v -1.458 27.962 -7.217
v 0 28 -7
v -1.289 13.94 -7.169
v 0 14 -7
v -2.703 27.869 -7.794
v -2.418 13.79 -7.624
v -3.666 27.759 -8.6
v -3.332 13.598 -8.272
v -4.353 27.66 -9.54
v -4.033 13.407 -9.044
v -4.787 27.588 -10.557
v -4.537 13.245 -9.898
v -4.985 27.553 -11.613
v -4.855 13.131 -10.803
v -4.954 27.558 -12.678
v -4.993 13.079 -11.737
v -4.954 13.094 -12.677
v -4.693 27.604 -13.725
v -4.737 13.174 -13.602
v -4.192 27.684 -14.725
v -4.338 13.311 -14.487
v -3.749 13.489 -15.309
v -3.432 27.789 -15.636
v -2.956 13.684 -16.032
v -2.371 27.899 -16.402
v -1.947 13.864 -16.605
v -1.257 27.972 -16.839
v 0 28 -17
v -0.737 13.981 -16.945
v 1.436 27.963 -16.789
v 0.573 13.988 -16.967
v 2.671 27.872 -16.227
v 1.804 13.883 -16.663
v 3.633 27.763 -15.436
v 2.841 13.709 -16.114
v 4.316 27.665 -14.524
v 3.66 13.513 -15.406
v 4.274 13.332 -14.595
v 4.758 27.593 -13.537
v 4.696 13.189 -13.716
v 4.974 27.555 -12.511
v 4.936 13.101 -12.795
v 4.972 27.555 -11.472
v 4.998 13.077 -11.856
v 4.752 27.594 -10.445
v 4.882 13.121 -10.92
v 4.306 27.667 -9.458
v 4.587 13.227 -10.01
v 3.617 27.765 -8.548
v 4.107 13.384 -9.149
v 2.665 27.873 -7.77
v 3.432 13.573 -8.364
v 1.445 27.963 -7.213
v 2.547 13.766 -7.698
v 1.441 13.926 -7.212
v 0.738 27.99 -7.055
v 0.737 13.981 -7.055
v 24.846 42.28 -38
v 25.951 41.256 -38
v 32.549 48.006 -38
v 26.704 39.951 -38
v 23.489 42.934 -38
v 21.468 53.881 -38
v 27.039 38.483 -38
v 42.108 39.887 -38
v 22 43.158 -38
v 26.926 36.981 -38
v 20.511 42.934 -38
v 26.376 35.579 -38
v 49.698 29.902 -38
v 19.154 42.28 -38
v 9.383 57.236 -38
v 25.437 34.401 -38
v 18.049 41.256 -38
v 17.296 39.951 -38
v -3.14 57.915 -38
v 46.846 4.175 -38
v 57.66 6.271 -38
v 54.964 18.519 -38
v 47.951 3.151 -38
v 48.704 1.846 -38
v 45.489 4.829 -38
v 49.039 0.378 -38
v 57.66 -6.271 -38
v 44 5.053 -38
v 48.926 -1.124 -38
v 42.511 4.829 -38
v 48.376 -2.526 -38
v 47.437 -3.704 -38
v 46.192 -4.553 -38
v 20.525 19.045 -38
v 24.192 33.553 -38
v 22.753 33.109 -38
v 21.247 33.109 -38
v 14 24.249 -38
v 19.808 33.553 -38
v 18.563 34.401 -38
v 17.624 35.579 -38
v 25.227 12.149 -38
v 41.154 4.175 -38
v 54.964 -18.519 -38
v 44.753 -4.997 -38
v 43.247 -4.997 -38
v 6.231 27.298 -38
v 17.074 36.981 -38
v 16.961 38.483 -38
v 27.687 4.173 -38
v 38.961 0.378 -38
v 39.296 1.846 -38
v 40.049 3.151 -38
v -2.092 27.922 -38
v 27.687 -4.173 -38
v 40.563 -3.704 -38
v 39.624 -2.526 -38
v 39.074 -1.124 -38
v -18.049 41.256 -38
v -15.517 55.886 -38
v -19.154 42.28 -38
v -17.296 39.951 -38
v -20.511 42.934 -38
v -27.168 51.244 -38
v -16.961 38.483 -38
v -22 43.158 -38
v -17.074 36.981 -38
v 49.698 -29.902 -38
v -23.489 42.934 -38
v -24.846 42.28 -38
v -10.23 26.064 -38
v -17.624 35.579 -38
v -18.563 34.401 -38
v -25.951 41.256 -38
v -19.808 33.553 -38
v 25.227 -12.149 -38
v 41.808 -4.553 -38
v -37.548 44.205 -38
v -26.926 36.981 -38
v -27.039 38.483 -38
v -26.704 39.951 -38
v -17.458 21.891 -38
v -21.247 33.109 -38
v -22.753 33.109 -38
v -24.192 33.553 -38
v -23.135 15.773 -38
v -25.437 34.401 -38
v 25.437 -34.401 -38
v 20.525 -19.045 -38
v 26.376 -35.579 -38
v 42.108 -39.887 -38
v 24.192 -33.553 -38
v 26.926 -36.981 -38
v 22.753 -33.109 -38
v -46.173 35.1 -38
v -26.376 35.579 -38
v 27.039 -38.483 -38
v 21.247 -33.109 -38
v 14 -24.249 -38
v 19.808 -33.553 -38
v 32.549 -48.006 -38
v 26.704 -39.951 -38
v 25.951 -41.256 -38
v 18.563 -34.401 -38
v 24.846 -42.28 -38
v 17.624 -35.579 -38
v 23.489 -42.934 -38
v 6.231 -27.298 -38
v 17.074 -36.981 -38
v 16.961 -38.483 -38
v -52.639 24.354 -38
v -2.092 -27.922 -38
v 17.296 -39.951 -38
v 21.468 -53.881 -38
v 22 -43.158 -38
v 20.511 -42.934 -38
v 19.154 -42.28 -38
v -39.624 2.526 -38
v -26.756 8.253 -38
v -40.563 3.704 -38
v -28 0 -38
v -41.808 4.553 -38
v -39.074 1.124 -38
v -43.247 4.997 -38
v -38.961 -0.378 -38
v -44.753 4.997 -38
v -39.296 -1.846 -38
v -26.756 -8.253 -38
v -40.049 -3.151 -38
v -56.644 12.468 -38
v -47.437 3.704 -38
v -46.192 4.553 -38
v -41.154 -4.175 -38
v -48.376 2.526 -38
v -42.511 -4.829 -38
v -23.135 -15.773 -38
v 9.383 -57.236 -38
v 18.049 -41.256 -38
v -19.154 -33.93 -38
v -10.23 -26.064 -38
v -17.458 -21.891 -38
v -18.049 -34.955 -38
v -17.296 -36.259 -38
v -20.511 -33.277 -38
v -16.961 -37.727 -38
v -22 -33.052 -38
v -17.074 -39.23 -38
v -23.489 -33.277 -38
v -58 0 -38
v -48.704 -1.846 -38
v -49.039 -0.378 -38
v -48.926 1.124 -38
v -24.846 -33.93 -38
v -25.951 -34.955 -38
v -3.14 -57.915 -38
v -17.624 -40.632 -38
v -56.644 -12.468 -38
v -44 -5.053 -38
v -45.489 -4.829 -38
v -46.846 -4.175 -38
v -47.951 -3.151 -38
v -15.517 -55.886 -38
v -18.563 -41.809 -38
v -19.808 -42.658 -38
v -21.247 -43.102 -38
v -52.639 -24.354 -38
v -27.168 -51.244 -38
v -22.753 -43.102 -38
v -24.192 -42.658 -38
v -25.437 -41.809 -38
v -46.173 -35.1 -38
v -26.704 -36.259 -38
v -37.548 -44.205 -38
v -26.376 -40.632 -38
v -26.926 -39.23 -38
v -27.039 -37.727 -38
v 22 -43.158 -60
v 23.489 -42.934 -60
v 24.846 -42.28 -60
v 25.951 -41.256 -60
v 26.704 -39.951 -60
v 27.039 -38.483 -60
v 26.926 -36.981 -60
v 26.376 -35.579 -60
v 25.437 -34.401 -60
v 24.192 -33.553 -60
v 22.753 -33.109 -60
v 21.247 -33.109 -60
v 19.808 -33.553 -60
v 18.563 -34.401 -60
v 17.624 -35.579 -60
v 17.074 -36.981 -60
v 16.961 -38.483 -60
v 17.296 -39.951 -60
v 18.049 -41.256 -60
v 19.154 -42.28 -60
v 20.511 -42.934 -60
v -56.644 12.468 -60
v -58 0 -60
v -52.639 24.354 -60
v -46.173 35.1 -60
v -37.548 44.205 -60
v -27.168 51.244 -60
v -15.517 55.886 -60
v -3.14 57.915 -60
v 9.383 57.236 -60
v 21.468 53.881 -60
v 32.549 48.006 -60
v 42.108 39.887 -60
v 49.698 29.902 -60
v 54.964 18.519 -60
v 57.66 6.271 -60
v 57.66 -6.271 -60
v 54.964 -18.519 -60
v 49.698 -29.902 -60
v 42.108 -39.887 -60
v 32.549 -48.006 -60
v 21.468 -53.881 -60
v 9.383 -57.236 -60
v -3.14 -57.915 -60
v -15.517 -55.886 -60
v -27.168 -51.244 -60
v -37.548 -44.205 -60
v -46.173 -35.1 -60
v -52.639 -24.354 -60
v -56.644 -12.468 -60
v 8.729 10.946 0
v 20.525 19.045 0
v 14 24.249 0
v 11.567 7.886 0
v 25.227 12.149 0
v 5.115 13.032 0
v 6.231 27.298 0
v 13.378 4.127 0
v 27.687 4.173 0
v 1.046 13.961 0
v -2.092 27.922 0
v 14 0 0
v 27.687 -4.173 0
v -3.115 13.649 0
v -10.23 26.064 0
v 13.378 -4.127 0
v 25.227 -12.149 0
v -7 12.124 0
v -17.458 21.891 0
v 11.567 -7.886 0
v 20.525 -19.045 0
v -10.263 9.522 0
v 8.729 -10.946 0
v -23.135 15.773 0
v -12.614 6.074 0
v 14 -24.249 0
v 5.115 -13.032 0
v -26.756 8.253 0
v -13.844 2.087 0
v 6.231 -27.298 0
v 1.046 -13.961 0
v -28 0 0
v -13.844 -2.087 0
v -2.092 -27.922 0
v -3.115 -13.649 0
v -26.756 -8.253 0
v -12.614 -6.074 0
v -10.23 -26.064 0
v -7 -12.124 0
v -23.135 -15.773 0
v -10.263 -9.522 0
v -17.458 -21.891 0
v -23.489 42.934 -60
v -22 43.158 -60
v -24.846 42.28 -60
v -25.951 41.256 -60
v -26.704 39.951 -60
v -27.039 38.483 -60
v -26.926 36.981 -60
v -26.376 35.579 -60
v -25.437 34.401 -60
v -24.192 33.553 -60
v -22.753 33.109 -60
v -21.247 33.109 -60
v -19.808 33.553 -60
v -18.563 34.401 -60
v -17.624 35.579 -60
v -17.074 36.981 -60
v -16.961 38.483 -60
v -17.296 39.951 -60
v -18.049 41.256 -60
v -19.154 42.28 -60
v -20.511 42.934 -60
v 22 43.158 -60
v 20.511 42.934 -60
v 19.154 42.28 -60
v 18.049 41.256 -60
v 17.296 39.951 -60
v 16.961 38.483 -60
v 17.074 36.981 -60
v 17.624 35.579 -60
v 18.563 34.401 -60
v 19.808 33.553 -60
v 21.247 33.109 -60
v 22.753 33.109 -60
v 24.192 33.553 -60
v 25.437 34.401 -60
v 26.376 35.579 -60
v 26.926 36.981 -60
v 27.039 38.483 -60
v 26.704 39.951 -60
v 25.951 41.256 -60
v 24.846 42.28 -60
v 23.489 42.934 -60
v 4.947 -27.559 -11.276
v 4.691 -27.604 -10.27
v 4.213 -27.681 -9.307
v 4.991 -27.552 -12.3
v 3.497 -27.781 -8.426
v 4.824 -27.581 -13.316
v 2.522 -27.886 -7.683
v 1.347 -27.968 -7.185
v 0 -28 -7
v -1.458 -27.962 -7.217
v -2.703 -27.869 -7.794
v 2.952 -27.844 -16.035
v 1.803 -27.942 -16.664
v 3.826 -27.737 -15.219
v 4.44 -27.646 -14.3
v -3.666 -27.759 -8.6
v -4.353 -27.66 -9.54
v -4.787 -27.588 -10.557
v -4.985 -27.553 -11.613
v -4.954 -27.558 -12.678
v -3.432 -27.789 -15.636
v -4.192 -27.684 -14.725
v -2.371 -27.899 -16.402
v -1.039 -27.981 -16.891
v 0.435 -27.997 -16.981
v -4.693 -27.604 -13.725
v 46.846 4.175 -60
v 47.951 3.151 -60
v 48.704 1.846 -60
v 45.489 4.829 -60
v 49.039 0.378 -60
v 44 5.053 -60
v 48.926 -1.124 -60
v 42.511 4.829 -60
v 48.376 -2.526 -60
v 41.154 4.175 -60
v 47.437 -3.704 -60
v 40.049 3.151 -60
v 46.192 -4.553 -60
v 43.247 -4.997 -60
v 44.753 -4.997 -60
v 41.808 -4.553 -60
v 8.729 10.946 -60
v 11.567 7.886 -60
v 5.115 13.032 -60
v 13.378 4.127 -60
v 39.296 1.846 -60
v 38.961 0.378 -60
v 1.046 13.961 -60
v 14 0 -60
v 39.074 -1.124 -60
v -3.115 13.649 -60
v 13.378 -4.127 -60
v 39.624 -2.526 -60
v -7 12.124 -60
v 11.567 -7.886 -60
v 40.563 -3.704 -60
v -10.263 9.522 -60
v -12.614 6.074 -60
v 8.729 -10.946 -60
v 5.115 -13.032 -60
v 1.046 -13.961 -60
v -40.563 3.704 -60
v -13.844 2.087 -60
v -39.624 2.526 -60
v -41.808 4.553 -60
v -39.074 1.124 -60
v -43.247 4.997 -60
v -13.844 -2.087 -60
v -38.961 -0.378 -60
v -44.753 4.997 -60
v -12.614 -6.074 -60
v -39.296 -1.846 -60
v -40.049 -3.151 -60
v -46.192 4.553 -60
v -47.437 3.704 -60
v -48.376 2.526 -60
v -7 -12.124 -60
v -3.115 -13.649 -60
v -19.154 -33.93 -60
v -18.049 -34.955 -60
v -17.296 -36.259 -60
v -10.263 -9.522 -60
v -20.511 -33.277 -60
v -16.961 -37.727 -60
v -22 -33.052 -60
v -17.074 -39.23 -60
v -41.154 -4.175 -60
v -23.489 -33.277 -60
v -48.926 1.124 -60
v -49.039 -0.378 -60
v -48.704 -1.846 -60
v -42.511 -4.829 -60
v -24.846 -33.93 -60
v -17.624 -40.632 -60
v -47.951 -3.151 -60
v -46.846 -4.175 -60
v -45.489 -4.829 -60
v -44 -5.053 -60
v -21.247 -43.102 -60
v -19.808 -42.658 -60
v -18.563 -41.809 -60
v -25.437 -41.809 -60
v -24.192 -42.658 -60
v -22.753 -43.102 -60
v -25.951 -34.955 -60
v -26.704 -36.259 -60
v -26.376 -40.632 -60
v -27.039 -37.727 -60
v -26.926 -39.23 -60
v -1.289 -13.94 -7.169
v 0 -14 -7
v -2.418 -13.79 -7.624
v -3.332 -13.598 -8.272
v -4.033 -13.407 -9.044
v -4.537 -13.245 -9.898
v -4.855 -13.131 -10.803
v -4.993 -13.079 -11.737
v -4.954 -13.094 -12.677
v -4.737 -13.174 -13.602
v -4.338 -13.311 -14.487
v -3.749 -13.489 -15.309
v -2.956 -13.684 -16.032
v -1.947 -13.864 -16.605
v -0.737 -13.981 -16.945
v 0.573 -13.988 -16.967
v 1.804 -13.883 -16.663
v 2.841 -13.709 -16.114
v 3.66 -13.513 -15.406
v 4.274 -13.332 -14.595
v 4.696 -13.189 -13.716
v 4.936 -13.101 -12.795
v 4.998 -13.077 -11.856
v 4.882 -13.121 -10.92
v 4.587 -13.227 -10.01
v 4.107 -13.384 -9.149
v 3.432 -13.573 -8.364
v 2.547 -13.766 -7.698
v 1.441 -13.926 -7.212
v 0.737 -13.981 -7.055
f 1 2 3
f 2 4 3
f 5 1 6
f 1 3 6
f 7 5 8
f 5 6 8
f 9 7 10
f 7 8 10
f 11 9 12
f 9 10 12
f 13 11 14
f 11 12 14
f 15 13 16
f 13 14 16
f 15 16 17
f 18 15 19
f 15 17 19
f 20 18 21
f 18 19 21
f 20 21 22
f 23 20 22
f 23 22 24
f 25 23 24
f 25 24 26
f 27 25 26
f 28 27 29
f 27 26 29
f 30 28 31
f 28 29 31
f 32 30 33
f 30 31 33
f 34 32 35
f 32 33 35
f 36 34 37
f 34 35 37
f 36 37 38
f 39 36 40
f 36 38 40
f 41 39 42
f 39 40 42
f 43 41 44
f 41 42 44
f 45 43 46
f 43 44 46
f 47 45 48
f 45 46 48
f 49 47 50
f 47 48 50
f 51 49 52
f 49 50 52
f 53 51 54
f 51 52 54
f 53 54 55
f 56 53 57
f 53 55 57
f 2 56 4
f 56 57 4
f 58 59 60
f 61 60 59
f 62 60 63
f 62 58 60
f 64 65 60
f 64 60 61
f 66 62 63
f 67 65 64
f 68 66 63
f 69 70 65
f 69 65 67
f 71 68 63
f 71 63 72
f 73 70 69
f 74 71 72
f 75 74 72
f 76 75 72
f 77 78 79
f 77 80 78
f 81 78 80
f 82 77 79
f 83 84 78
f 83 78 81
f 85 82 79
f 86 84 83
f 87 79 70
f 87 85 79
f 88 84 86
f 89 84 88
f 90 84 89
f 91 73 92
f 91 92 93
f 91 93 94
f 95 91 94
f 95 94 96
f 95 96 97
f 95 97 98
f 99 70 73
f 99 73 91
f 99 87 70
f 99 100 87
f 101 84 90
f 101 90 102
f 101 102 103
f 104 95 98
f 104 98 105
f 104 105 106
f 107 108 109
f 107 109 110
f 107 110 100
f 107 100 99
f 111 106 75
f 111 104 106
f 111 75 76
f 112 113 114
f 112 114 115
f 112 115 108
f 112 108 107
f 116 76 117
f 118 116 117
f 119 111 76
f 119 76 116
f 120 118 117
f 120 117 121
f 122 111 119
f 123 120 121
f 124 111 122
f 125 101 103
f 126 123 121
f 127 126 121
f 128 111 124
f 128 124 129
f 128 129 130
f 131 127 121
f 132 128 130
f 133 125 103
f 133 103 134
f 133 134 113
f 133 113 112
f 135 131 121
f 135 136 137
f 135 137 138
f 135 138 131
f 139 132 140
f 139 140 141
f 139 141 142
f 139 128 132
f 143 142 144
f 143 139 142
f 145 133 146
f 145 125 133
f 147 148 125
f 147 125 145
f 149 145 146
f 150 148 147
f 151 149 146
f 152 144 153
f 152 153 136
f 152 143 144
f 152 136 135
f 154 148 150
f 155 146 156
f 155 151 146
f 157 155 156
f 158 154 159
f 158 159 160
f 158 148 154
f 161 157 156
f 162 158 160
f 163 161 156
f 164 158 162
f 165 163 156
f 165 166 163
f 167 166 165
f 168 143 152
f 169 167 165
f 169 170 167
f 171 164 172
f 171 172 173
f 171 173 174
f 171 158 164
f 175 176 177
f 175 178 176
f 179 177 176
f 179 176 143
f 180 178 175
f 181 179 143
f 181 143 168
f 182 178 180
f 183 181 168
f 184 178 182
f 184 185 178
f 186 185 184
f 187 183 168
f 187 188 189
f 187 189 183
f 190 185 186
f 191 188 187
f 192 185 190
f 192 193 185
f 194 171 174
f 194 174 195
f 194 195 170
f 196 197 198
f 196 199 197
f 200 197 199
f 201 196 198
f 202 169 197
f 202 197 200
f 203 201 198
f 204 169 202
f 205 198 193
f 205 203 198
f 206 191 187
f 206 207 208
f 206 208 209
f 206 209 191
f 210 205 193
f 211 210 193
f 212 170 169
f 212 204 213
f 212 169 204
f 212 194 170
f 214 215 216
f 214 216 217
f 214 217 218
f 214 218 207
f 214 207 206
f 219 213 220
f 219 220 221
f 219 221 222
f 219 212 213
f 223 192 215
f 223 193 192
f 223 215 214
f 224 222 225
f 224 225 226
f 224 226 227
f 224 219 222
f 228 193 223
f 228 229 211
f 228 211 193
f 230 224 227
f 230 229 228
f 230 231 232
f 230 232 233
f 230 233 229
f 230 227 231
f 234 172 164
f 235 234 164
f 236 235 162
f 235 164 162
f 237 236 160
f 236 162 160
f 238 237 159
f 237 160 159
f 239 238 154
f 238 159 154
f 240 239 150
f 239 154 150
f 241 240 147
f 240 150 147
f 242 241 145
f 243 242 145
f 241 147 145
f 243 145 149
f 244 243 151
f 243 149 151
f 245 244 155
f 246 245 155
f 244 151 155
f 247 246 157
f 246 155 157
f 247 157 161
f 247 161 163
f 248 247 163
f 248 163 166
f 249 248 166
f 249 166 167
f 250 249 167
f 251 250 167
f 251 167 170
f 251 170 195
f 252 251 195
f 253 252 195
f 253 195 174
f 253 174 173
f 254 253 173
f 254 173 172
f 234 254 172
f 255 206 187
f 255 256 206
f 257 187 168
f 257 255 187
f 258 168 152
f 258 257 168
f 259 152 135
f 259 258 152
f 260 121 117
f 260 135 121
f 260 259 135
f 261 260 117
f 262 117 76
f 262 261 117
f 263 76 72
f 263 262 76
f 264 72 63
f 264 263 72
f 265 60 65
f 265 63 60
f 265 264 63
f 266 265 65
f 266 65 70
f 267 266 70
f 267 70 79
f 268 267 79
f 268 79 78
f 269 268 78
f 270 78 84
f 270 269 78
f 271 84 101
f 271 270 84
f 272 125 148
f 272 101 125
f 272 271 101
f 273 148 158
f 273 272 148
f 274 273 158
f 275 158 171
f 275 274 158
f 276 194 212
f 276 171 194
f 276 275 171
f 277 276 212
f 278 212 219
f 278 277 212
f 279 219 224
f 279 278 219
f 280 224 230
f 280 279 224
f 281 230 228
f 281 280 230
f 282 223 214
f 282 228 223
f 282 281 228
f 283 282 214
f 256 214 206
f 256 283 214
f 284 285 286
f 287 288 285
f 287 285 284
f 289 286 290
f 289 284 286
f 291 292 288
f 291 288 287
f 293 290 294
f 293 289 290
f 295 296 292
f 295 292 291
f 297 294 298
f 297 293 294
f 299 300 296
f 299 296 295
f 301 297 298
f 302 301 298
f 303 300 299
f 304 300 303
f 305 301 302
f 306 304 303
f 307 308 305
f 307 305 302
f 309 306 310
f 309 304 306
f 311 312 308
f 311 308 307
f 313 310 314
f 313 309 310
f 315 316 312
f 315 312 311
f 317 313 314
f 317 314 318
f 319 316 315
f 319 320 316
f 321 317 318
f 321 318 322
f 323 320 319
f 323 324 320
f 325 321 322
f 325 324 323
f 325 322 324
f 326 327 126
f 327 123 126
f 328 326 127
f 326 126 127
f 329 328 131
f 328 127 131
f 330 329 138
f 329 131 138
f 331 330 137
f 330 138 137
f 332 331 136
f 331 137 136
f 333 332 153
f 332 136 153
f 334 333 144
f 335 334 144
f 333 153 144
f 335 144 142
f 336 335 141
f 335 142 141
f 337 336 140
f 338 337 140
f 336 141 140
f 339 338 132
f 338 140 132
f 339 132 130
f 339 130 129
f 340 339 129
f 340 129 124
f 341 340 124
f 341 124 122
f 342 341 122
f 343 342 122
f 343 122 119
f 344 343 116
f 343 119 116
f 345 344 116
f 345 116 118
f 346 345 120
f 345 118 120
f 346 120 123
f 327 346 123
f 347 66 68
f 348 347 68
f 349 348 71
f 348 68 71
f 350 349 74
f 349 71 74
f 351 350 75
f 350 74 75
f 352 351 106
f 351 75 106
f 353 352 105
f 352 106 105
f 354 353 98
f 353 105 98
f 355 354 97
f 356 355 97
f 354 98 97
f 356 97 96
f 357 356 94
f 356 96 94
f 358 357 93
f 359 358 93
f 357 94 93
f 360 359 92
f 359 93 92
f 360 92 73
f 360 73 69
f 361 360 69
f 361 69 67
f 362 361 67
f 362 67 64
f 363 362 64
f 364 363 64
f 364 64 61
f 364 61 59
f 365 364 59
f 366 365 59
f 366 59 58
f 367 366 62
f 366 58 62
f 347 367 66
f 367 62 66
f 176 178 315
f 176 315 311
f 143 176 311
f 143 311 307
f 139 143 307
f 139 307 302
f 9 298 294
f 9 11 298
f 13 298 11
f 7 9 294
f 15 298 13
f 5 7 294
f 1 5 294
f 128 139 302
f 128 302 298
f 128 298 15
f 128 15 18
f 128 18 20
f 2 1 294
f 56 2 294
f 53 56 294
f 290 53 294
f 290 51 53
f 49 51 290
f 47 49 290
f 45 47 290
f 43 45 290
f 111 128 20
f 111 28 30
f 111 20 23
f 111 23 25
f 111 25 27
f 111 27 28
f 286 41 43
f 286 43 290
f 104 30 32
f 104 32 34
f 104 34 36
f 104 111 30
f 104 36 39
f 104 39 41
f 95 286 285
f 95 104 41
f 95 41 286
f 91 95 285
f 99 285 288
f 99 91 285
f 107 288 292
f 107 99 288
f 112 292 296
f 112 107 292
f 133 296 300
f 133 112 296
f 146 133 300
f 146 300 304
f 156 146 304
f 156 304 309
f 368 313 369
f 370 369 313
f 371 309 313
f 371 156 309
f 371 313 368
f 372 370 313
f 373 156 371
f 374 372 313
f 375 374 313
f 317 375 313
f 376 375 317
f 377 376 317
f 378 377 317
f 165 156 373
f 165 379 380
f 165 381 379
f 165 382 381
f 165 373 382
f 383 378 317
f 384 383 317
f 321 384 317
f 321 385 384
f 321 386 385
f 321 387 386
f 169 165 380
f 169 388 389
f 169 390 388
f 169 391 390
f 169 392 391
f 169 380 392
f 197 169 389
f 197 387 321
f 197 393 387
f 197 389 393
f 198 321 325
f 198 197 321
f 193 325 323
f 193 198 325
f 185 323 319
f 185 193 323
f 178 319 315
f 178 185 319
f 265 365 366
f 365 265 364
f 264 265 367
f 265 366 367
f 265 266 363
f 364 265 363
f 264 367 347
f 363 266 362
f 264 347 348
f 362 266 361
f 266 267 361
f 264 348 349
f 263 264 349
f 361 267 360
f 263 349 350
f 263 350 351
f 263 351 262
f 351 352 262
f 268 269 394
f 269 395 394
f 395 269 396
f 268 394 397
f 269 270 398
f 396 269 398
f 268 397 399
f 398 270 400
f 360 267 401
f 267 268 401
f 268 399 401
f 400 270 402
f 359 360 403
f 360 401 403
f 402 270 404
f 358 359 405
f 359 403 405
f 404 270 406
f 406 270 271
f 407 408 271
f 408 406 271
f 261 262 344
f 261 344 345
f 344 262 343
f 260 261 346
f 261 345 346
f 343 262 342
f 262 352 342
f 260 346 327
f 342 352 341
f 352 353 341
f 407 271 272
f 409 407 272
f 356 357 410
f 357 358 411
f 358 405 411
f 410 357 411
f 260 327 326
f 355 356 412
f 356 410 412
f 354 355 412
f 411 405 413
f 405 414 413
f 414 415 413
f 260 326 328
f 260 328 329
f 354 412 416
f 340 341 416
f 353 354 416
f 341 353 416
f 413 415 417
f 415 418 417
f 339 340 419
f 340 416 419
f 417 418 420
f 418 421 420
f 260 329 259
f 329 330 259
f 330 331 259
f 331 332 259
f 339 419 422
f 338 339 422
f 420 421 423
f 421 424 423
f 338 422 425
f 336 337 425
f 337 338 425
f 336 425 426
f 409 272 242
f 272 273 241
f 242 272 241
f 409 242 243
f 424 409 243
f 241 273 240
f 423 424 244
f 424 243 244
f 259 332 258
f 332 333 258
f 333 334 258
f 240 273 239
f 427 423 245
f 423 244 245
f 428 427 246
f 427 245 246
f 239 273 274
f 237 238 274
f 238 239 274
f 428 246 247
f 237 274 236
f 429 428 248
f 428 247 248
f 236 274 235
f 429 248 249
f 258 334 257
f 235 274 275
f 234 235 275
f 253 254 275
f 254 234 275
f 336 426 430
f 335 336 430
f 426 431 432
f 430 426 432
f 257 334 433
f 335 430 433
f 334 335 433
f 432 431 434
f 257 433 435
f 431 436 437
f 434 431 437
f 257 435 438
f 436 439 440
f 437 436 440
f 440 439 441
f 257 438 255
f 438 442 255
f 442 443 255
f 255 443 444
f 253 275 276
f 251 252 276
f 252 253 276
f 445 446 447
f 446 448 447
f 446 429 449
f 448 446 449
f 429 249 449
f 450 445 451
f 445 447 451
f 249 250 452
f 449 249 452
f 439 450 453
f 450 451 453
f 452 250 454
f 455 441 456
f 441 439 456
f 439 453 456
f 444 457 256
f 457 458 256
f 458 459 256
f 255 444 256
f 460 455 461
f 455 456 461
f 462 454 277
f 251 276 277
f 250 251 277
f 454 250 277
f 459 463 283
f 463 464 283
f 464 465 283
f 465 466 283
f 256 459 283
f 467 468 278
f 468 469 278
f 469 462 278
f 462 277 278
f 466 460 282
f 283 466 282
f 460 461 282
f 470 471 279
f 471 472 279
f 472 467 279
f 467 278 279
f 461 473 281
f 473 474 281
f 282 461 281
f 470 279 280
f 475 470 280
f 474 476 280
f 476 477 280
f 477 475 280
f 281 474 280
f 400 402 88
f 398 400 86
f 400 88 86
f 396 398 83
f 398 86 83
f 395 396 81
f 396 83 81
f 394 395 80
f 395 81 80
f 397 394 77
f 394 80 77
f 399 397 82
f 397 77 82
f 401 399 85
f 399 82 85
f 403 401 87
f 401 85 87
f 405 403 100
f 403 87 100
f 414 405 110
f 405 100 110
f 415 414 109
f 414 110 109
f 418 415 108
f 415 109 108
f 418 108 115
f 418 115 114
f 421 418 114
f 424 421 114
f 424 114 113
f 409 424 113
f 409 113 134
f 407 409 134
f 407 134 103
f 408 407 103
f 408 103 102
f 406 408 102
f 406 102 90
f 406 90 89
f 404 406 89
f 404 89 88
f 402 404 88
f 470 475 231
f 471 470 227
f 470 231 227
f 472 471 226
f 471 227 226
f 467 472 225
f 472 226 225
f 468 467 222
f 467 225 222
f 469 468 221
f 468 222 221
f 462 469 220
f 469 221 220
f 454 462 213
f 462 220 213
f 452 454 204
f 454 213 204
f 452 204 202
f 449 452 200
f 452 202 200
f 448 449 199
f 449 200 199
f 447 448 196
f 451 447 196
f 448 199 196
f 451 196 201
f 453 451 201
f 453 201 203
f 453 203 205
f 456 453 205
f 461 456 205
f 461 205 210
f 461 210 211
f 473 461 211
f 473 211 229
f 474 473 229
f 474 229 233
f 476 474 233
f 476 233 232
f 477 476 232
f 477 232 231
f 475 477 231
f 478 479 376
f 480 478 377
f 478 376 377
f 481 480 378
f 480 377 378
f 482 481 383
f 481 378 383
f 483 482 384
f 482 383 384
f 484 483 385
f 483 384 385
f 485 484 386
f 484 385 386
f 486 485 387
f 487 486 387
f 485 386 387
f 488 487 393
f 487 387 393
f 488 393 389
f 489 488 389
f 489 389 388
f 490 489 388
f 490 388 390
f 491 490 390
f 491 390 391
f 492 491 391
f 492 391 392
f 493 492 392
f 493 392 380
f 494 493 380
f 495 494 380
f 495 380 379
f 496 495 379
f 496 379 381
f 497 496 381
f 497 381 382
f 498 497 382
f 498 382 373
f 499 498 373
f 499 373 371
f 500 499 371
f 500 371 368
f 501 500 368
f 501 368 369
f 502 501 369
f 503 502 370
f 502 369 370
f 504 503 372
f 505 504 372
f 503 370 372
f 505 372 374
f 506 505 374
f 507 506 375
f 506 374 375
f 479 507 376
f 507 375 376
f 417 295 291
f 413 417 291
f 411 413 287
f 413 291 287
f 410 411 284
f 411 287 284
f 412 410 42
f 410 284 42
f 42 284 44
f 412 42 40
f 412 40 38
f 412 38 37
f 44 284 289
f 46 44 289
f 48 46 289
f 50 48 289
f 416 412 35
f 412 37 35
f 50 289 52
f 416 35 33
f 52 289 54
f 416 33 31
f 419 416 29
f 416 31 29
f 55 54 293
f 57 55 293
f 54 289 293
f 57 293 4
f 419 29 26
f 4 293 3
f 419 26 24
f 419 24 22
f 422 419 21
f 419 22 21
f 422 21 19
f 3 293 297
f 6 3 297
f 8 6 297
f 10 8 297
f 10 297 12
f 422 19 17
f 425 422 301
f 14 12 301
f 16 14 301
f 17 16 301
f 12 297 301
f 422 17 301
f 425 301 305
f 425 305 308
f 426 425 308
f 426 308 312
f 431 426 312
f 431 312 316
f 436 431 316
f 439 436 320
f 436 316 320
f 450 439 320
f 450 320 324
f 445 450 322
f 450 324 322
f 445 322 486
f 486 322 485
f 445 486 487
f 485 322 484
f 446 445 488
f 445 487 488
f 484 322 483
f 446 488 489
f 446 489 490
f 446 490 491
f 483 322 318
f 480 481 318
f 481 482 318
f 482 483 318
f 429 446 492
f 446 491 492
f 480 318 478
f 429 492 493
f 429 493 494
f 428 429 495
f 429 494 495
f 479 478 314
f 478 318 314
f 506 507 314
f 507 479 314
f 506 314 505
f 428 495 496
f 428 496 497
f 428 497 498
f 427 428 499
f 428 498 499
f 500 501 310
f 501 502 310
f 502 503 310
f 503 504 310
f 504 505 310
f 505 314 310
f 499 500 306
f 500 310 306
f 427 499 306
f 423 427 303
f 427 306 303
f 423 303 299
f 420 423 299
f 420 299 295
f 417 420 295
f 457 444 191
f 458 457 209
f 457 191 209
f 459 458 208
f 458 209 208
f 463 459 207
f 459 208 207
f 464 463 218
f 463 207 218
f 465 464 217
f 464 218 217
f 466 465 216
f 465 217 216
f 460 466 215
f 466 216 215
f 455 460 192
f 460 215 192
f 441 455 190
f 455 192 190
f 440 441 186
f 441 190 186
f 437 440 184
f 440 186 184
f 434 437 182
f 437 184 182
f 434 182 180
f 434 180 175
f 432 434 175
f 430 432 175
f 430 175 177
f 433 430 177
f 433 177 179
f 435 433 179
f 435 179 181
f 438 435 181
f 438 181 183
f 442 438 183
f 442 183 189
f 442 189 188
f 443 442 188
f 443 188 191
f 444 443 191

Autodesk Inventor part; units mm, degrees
ref_plane "YZ Plane" through (0, 0, 0) normal (1, 0, 0) x (0, 1, 0)
ref_plane "XY Plane" through (0, 0, 0) normal (0, 0, 1) x (1, 0, 0)
sketch "Skizze1" plane through (0, 0, 0) normal (0, 1, 0) x (-1, 0, 0)
  line L0 (0, 0) -> (28, 0)
  line L1 (28, 0) -> (28, -38)
  line L2 (28, -38) -> (58, -38)
  line L3 (58, -38) -> (58, -60)
  line L4 (58, -60) -> (0, -60)
  line L5 (0, -60) -> (0, 0)
  dimension "d0" = 116
  dimension "d1" = 56
  dimension "d2" = 22
  dimension "d3" = 38
revolve "Umdrehung1" add sketch "Skizze1" angle 360 about axis through (0, 0, -60) along (0, 0, 1)
sketch "Skizze2" plane through (0, 0, 0) normal (0, 0, 1) x (1, 0, 0)
  circle A0 centre (0, 0) radius 14
  dimension "d5" = 28
extrude "Extrusion1" cut sketch "Skizze2" against normal up to surface (60 mm away)
ref_plane "Arbeitsebene1" through (0, 28, 0) normal (0, 1, 0) x (-1, 0, 0)
sketch "Skizze3" plane through (0, 28, 0) normal (0, 1, 0) x (-1, 0, 0)
  point P0 (0, 0)
  point P1 (0, -12)
  dimension "d9" = 12
hole "Bohrung1" at (0, 28, -12) direction (0, -1, 0) diameter 10 end through all
sketch "Skizze4" plane through (0, 0, -60) normal (0, 0, -1) x (-1, 0, 0)
  circle A0 centre (0, 0) radius 44 construction
  circle A1 centre (0, 0) radius 14 projected
  line L0 (0, 0) -> (0, 62.7079) construction
  line L1 (0, 0) -> (-33.1711, 57.4541) construction
  line L2 (0, 0) -> (35.197, 60.963) construction
  point P0 (-22, 38.1051)
  point P1 (22, 38.1051)
  dimension "d17" = 88
  dimension "d18" = 30
  dimension "d19" = 30
hole "Bohrung2" at (22, 38.1051, -60) at (-22, 38.1051, -60) direction (0, 0, 1) diameter 10.106 depth 22 thread size "M12x1.75" class "6H" standard "ISO Metric profile"
pattern_circular "Runde Anordnung1" count 6 over 360 about axis through (0, 0, -49) along (0, 0, 1) of "Bohrung2"
properties part number "cover"
